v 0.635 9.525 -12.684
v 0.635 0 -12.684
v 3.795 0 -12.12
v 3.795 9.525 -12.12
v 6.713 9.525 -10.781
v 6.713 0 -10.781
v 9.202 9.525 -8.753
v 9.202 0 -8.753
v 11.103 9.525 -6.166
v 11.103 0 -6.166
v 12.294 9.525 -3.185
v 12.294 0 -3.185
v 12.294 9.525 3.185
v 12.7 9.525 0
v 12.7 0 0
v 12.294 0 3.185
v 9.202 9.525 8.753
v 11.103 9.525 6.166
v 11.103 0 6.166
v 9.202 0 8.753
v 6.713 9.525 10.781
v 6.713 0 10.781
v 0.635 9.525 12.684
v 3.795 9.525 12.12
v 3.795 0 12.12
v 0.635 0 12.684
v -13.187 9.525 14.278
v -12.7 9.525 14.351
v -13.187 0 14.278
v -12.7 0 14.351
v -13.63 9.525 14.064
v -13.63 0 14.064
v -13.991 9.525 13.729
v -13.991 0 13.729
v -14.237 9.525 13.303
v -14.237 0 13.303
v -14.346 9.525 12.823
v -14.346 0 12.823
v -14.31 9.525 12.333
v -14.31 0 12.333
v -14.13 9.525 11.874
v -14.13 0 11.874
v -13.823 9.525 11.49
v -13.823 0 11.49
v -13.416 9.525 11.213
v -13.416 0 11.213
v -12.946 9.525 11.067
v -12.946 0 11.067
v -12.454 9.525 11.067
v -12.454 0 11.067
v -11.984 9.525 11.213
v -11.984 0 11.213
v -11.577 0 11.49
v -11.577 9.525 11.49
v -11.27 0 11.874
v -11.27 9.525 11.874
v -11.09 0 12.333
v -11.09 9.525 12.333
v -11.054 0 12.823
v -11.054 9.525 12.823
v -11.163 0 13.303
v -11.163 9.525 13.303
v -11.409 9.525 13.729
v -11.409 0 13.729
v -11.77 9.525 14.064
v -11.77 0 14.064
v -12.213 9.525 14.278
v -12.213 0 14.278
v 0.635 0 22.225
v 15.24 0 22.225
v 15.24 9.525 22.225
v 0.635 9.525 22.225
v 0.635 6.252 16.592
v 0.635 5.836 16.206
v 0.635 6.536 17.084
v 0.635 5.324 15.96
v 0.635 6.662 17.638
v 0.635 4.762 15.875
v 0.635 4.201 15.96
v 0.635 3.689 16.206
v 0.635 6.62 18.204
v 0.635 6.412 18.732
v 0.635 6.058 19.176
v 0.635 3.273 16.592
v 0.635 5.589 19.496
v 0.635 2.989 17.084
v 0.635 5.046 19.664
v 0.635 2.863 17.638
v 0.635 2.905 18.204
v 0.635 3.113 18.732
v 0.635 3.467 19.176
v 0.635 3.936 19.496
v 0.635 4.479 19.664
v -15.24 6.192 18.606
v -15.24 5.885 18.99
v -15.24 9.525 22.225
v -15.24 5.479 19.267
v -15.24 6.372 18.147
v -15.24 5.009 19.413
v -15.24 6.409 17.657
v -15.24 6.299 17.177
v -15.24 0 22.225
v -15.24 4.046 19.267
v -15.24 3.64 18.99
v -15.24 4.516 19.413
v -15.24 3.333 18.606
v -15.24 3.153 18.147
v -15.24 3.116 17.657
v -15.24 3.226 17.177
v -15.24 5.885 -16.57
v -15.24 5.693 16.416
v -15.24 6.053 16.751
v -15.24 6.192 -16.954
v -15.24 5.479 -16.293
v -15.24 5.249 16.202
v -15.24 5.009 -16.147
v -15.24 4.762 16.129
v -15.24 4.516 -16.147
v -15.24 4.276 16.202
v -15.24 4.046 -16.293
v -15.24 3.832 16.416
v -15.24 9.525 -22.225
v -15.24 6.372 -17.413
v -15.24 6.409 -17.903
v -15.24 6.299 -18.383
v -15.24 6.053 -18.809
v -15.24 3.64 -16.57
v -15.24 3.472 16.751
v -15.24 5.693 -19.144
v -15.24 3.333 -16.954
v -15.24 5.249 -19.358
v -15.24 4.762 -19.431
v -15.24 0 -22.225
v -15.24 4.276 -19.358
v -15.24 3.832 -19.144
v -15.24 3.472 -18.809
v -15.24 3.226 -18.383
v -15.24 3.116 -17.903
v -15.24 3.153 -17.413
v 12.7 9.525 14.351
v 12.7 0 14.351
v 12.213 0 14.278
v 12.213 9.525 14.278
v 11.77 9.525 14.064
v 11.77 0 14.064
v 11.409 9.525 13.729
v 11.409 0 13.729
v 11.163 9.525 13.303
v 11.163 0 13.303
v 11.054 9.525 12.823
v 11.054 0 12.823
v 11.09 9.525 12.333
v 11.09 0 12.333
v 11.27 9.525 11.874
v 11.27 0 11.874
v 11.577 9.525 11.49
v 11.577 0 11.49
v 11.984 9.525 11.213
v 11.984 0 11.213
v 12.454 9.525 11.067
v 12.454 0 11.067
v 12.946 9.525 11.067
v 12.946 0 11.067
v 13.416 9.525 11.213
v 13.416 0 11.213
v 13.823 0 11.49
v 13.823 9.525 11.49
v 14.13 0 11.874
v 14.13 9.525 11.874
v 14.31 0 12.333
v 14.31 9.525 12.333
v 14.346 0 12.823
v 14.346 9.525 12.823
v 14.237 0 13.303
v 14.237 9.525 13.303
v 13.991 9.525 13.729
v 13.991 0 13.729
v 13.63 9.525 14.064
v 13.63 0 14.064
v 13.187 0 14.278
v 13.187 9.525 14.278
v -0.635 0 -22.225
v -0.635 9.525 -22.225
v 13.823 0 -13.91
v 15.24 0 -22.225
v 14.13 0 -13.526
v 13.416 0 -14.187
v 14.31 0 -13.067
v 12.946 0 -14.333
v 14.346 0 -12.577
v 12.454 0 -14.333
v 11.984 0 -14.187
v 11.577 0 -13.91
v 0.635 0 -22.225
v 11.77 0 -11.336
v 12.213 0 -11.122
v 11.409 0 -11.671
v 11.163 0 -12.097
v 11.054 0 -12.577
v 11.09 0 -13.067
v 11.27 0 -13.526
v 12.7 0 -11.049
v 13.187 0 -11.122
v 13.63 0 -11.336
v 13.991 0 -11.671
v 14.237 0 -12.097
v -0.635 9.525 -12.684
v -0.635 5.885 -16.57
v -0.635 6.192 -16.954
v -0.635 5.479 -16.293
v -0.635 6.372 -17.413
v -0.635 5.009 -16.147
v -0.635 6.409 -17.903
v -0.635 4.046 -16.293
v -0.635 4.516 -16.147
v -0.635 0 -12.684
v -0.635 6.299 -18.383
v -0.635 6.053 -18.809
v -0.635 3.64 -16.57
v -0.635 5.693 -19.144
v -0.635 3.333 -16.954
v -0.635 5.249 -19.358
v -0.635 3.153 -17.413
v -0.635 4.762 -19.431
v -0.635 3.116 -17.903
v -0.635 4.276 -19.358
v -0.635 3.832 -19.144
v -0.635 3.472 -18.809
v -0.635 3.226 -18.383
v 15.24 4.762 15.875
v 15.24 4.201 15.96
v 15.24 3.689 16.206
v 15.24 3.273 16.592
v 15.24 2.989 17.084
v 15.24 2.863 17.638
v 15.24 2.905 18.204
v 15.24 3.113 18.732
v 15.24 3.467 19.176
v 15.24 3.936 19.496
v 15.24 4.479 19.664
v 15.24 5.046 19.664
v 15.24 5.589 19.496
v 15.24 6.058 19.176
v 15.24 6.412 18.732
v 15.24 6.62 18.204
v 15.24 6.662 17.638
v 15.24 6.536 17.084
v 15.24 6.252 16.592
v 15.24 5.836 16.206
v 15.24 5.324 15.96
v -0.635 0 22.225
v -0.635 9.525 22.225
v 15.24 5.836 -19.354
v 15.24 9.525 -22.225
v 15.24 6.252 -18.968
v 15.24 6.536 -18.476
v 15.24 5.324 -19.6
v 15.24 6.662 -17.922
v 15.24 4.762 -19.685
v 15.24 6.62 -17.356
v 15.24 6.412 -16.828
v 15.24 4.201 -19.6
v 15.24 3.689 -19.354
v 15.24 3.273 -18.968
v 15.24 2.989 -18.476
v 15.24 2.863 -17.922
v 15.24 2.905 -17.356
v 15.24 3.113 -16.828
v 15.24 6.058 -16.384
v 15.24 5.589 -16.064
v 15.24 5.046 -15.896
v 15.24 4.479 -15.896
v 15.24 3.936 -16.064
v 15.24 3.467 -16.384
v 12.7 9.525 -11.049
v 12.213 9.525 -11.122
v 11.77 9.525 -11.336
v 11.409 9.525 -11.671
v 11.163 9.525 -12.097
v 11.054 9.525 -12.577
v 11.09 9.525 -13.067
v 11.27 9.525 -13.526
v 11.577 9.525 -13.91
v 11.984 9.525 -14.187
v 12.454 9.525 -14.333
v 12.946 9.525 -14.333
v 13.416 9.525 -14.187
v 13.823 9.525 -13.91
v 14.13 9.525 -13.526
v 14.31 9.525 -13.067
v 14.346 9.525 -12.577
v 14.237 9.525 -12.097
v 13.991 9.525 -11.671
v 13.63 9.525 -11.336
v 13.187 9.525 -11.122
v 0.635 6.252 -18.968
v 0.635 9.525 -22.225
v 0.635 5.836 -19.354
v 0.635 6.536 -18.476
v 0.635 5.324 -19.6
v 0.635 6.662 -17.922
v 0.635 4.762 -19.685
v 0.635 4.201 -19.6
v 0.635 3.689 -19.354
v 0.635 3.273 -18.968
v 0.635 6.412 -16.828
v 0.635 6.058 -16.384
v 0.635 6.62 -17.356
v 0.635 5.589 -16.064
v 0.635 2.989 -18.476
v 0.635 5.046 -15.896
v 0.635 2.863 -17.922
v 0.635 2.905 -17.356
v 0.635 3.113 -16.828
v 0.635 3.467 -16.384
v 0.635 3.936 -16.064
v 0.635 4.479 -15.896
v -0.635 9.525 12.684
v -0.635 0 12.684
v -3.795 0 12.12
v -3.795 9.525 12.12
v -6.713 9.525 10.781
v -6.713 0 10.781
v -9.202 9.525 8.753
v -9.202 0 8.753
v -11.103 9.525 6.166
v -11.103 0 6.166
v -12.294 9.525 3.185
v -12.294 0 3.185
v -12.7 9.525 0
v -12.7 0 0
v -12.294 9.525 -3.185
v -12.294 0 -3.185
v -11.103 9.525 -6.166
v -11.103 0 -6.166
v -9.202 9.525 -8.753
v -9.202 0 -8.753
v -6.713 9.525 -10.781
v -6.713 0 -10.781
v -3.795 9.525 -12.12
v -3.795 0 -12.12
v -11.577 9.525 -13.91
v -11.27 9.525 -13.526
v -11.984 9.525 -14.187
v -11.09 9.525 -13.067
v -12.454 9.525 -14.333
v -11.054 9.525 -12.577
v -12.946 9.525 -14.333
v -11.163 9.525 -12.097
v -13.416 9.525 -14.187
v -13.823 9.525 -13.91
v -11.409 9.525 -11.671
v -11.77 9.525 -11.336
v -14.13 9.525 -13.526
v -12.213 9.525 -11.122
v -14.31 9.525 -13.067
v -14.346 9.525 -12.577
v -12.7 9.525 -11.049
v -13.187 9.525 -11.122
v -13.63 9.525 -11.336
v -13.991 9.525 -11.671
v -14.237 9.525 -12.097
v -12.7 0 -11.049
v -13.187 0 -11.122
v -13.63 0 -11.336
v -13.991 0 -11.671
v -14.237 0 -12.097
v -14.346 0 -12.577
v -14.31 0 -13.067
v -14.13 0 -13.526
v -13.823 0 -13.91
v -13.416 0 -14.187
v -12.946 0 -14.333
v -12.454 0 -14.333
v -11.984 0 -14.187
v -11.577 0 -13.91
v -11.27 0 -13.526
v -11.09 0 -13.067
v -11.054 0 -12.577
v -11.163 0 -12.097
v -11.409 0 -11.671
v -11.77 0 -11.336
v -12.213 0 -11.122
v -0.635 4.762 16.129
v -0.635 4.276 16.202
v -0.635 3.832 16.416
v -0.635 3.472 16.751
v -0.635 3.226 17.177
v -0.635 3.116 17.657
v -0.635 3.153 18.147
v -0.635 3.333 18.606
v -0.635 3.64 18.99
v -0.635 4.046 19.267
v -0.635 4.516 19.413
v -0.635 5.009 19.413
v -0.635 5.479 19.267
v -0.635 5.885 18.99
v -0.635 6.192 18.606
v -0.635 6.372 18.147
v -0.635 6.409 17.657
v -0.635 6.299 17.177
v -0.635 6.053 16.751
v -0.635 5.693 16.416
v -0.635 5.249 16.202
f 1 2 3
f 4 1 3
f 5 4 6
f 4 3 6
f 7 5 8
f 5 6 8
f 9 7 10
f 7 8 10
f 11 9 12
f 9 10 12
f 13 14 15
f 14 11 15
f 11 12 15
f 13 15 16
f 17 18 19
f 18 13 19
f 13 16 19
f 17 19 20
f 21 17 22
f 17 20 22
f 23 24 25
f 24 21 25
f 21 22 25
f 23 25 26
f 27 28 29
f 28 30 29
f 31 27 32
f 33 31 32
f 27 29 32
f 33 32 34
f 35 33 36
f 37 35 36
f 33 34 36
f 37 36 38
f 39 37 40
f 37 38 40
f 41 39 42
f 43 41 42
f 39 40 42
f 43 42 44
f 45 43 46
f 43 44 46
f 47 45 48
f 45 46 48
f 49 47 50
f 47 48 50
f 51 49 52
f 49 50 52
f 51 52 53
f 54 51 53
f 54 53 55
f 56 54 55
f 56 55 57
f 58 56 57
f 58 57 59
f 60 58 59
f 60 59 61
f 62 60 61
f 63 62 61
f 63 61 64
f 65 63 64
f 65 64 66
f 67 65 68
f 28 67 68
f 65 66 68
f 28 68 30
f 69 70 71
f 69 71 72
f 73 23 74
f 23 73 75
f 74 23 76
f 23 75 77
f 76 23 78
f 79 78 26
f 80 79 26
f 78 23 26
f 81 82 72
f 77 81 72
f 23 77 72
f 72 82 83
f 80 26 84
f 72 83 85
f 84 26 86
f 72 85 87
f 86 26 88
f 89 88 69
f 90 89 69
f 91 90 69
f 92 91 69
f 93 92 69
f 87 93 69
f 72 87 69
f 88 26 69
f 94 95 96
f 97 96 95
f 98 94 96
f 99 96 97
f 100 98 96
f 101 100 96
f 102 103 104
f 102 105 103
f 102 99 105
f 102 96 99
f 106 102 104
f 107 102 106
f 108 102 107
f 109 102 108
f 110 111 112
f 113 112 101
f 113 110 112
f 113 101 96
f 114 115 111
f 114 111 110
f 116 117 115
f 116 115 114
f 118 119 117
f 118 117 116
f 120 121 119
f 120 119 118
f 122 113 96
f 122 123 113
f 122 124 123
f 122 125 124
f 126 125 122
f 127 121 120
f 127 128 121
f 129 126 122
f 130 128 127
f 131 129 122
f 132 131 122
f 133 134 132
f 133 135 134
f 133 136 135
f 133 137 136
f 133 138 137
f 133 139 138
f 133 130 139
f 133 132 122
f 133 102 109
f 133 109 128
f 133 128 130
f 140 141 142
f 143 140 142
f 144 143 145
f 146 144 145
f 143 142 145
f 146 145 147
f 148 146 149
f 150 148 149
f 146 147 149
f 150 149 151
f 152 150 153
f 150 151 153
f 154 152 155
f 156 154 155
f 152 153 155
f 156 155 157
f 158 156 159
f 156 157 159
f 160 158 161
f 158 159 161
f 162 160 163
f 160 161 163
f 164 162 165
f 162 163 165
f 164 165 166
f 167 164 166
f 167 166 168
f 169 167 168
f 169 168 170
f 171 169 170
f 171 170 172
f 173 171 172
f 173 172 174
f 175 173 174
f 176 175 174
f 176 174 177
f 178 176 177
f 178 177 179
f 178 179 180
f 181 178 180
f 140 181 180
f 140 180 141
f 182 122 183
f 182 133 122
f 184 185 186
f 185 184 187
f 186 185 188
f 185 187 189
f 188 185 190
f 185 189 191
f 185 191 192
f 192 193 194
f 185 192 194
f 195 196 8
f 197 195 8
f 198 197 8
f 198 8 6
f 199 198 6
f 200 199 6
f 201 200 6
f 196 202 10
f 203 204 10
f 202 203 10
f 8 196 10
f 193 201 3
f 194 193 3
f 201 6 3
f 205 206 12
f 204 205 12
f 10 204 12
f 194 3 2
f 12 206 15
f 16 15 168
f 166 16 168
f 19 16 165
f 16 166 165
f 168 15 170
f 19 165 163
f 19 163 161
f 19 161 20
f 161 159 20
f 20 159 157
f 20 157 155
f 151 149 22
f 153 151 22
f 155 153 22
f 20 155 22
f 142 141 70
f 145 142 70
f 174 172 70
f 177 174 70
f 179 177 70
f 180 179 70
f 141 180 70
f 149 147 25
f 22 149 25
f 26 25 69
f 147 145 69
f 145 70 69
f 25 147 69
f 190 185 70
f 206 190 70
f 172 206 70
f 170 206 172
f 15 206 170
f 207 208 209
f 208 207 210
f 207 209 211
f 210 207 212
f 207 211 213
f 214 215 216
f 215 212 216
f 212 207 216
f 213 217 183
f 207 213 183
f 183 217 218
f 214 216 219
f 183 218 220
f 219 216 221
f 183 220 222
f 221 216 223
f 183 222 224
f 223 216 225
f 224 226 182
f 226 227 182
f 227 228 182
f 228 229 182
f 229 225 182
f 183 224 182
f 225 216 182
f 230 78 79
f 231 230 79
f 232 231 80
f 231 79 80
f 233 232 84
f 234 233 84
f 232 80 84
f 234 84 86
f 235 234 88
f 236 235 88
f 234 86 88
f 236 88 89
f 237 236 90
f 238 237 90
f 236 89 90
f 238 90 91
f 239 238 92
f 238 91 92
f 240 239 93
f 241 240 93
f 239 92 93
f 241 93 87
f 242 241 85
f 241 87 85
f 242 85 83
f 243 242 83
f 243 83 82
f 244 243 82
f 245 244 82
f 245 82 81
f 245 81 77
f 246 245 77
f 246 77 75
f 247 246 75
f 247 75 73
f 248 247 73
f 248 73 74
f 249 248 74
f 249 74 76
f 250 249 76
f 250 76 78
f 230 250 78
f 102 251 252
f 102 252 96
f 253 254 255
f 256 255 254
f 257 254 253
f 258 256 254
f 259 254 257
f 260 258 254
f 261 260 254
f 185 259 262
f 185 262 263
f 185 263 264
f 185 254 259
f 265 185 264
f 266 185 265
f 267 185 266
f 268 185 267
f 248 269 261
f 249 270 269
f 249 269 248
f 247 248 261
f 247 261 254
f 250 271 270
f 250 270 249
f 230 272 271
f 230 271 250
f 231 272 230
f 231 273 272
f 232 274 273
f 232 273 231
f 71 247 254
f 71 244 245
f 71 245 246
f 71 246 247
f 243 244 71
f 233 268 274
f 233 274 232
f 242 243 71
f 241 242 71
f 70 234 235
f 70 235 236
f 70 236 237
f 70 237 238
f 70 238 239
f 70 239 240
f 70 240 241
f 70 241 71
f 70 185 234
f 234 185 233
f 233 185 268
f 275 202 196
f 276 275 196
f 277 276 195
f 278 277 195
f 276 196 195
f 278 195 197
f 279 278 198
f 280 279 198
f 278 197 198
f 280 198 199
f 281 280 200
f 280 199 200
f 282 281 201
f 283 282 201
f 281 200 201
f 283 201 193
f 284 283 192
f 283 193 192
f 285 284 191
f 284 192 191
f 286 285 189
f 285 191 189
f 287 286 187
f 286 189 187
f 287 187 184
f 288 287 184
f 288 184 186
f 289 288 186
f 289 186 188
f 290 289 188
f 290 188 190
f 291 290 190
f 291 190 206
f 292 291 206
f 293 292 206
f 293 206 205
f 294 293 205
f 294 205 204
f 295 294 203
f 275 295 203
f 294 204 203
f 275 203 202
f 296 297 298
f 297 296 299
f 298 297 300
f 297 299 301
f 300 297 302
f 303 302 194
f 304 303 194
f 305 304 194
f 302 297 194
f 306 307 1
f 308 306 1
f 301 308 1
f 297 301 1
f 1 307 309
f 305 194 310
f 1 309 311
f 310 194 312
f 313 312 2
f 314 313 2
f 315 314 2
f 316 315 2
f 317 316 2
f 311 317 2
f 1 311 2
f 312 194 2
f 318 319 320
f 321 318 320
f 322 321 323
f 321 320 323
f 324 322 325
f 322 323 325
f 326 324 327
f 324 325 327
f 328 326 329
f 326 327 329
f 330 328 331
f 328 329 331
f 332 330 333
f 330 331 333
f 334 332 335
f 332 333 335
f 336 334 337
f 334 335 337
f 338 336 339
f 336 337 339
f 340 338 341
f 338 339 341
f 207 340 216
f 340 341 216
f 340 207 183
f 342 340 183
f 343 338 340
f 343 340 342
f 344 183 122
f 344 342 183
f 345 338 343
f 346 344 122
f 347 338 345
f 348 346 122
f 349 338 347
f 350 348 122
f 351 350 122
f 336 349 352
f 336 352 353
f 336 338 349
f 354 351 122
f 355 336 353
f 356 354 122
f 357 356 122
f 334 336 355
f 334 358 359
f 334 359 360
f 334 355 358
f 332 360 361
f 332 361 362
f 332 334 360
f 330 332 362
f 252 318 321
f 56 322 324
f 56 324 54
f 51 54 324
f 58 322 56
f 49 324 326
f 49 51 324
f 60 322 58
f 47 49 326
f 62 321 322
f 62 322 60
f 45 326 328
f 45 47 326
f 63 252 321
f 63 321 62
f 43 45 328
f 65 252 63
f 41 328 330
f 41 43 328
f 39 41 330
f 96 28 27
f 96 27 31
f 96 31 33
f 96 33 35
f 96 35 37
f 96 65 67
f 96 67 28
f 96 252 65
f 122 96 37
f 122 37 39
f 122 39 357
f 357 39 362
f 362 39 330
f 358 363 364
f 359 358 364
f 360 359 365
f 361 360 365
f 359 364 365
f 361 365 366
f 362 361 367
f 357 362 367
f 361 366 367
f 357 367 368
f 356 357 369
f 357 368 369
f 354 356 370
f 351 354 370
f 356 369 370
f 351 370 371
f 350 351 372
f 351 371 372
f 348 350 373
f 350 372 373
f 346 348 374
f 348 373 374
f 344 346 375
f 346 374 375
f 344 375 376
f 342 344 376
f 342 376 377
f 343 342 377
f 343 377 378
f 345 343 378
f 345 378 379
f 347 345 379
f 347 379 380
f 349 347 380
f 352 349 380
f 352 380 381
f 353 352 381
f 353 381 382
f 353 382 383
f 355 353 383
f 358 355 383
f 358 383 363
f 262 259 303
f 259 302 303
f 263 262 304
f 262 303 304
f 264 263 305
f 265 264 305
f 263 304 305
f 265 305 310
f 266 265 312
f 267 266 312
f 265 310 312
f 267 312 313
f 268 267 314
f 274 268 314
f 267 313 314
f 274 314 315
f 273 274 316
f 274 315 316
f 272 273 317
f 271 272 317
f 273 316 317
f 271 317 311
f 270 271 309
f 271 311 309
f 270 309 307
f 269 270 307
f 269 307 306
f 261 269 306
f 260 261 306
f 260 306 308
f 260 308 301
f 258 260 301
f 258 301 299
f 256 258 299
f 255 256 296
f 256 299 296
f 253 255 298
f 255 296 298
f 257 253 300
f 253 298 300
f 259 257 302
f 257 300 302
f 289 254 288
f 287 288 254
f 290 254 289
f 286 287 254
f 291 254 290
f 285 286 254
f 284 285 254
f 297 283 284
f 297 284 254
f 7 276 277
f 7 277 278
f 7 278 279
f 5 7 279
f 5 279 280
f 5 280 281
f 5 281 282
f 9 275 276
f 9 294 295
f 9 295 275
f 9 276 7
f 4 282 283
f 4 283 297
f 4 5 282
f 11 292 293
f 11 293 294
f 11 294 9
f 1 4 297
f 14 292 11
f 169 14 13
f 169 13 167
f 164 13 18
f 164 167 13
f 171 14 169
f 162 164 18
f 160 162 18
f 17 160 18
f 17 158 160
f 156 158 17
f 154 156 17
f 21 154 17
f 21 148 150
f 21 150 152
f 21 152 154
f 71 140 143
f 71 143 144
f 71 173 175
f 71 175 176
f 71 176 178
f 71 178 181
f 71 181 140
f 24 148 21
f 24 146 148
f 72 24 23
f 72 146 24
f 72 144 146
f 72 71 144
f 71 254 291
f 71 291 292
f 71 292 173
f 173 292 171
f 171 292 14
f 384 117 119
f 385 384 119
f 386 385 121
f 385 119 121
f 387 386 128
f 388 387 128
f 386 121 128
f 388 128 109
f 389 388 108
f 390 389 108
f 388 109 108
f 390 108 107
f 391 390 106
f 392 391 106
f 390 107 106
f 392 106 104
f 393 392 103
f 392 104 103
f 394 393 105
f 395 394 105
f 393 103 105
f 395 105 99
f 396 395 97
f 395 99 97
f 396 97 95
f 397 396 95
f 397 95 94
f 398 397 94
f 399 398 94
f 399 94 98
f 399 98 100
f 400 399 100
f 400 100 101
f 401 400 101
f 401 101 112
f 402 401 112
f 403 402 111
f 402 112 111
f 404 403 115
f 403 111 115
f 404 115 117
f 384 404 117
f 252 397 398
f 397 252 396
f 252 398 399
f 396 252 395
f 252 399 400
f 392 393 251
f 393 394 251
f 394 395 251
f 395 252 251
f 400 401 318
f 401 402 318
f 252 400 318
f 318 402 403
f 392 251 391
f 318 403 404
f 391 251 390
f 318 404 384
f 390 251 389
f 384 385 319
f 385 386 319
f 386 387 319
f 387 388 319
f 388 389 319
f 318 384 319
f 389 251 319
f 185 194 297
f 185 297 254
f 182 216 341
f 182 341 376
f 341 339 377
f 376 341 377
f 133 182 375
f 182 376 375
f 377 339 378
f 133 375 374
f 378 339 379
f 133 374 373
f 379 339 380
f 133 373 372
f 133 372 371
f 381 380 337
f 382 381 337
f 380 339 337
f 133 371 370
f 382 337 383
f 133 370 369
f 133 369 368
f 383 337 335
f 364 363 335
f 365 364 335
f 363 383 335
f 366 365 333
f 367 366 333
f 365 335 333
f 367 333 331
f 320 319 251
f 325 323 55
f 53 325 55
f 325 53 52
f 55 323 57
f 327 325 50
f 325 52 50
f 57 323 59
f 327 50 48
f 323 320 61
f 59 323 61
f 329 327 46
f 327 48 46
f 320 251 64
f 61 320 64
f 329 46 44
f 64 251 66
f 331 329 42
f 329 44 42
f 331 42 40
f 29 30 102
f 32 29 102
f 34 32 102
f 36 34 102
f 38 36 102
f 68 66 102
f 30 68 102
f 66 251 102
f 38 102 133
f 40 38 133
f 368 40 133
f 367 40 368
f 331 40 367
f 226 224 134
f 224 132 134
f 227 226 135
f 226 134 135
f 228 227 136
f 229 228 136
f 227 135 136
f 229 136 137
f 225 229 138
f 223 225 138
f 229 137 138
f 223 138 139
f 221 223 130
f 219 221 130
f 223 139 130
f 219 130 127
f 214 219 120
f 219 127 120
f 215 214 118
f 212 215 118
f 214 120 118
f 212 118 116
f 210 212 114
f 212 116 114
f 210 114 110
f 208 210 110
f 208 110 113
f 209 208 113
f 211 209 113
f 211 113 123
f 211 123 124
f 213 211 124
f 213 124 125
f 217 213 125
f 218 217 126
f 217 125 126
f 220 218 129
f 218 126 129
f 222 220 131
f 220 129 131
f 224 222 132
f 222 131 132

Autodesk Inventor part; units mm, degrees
ref_plane "YZ Plane" through (0, 0, 0) normal (1, 0, 0) x (0, 1, 0)
ref_plane "XZ Plane" through (0, 0, 0) normal (0, 1, 0) x (-1, 0, 0)
ref_plane "XY Plane" through (0, 0, 0) normal (0, 0, 1) x (1, 0, 0)
sketch "Sketch8" plane through (0, 0, 0) normal (0, 1, 0) x (-1, 0, 0)
  circle A0 centre (0, 0) radius 12.7
  line L0 (-15.24, 22.225) -> (15.24, 22.225)
  line L1 (15.24, 22.225) -> (15.24, -22.225)
  line L2 (15.24, -22.225) -> (-15.24, -22.225)
  line L3 (-15.24, -22.225) -> (-15.24, 22.225)
  line L4 (-15.24, 22.225) -> (15.24, -22.225) construction
  line L5 (15.24, 22.225) -> (-15.24, -22.225) construction
  line L6 (-0.635, 22.225) -> (0.635, 22.225)
  line L7 (0.635, 22.225) -> (0.635, -22.225)
  line L8 (0.635, -22.225) -> (-0.635, -22.225)
  line L9 (-0.635, -22.225) -> (-0.635, 22.225)
  line L10 (-0.635, 22.225) -> (0.635, -22.225) construction
  line L11 (0.635, 22.225) -> (-0.635, -22.225) construction
  dimension "d34" = 25.4
  dimension "d35" = 30.48
  dimension "d36" = 44.45
  dimension "d37" = 1.27
extrude "Extrusion6" add sketch "Sketch8" along normal blind 9.525 contours A0 L7 L0 L1 L2 | A0 L9 L2 L3 L0
sketch "Sketch9" plane through (15.24, 0, 22.225) normal (1, 0, 0) x (0, 0, -1)
  line L0 (4.445, -4.7625) -> (40.005, -4.7625) construction
  line L1 (40.005, -4.7625) -> (40.005, 4.7625) construction
  line L2 (40.005, 4.7625) -> (4.445, 4.7625) construction
  line L3 (4.445, 4.7625) -> (4.445, -4.7625) construction
  line L4 (4.445, -4.7625) -> (40.005, 4.7625) construction
  line L5 (40.005, -4.7625) -> (4.445, 4.7625) construction
  point P0 (22.225, 0)
  dimension "d40" = 35.56
  dimension "d41" = 9.525
hole "Hole3" at (15.24, 4.7625, 17.78) at (15.24, 4.7625, -17.78) direction (-1, 0, 0) diameter 3.81 depth 14.605 clearance for "Flat Head Machine Screw (82)" size "#6" standard "Ansi Unified Screw Threads"
sketch "Sketch10" plane through (-0.635, 0, 12.6841) normal (1, 0, 0) x (0, 0, -1)
  circle A0 centre (-5.0959, 4.7625) radius 1.905 projected
  circle A1 centre (30.4641, 4.7625) radius 1.905 projected
  point P0 (12.6841, 0)
hole "Hole4" at (-0.635, 4.7625, 17.78) at (-0.635, 4.7625, -17.78) direction (-1, 0, 0) diameter 3.302 end up to surface thread size "8-32 UNC" class "2B" standard "ANSI Unified Screw Threads"
sketch "Sketch11" plane through (0, 9.525, 0) normal (0, 1, 0) x (1, 0, 0)
  line L0 (-12.7, -12.7) -> (12.7, -12.7) construction
  line L1 (12.7, -12.7) -> (12.7, 12.7) construction
  line L2 (12.7, 12.7) -> (-12.7, 12.7) construction
  line L3 (-12.7, 12.7) -> (-12.7, -12.7) construction
  line L4 (-12.7, -12.7) -> (12.7, 12.7) construction
  line L5 (12.7, -12.7) -> (-12.7, 12.7) construction
  point P0 (0, 0)
  dimension "d56" = 25.4
  dimension "d57" = 25.4
hole "Hole5" at (-12.7, 9.525, -12.7) at (12.7, 9.525, -12.7) at (12.7, 9.525, 12.7) at (-12.7, 9.525, 12.7) direction (0, -1, 0) diameter 3.302 end through all thread size "8-32 UNC" class "2B" standard "ANSI Unified Screw Threads"
properties part number "4K heatsink bushing" material "Copper"
